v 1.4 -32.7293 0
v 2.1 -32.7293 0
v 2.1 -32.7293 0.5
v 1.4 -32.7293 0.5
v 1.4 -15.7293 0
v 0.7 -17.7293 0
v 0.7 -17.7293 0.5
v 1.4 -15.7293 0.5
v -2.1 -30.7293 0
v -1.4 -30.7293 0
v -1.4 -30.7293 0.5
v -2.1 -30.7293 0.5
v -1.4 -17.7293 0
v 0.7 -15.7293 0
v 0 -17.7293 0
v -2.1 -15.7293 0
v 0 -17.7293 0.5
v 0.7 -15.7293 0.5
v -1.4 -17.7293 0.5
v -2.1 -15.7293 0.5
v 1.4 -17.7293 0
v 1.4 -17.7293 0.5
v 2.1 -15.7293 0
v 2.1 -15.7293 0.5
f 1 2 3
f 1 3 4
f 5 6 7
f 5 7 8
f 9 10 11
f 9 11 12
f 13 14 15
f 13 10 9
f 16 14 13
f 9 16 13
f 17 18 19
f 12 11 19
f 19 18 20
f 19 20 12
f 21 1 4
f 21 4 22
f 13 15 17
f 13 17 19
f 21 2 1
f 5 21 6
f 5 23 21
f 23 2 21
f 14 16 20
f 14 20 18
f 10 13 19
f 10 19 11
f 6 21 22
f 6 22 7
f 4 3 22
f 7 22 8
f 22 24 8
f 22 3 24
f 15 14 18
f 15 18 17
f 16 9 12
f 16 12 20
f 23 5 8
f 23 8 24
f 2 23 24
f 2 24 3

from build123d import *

# Parameters (mm, degrees)
BOSS_EXTRUDE1_DEPTH   = 0.5
BOSS_EXTRUDE1_2_DEPTH = 0.5


with BuildPart() as part:
    # Sketch1 → Boss-Extrude1 (new body)
    with BuildSketch(Plane.XY):
        Polygon((1.4, -15.729262234), (2.1, -15.729262234), (2.1, -32.729262234), (1.4, -32.729262234), (1.4, -17.729262234), (0.7, -17.729262234), align=None)
    extrude(amount=BOSS_EXTRUDE1_DEPTH)


with BuildPart() as body_2:
    # Sketch1 → Boss-Extrude1 2 (new body)
    with BuildSketch(Plane.XY):
        Polygon((0.7, -15.729262234), (0, -17.729262234), (-1.4, -17.729262234), (-1.4, -30.729262234), (-2.1, -30.729262234), (-2.1, -15.729262234), align=None)
    extrude(amount=BOSS_EXTRUDE1_2_DEPTH)


solid = Compound([part.part, body_2.part])
